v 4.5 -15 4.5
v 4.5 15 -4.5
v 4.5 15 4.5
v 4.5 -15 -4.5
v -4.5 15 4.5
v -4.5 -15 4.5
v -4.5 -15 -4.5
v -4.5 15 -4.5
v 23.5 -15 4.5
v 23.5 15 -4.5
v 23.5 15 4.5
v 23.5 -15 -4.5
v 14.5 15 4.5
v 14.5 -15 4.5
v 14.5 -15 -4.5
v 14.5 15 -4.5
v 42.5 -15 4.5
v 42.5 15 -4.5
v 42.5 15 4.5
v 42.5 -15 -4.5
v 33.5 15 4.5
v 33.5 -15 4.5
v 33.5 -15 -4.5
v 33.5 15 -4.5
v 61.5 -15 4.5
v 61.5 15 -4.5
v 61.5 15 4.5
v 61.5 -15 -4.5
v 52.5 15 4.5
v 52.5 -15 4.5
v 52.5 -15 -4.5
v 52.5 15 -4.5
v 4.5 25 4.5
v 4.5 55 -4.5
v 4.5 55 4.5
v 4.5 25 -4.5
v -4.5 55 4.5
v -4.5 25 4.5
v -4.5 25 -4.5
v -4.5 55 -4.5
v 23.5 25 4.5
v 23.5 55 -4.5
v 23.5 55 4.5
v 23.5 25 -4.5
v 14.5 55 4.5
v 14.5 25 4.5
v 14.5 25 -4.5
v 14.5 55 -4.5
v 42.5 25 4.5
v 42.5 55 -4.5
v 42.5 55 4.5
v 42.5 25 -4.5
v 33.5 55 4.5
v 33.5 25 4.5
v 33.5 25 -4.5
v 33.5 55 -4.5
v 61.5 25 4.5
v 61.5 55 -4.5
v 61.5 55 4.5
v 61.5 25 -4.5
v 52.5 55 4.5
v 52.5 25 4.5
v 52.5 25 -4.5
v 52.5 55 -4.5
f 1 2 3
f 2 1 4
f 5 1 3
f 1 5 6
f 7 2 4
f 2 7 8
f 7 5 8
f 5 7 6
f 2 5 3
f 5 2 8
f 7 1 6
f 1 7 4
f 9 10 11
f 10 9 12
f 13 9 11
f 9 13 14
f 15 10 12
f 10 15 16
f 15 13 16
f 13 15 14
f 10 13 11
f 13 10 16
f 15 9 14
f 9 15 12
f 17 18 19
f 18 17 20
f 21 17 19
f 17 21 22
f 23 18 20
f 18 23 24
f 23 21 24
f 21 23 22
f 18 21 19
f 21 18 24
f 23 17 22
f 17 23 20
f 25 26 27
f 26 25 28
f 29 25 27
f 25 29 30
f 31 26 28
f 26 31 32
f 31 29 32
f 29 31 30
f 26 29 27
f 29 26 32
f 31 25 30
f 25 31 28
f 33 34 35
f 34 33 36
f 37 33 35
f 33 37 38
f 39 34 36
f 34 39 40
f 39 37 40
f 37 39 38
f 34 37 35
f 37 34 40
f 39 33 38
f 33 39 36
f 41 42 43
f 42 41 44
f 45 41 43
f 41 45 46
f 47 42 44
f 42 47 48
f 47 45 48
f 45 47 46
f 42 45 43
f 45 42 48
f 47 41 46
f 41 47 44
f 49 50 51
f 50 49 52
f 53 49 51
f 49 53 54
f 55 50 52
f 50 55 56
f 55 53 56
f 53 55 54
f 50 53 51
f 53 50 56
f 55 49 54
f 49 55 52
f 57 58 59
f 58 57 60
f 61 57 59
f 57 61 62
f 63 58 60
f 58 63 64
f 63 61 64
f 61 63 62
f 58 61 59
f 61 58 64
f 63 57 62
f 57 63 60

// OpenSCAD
$fn=50; // Sets the number of fragments for rounded shapes. Increase for better resolution.
BOX_W = 9.0; // Box Width
BOX_L = 30;// Box Length
BOX_H = 9.0; // Box Height

module rectangle(width, height, length) {
    cube([width, length, height], center=true);
}

// Call the module to create four rectangular objects, each 10mm apart.
for (i=[0:3]) {
    translate([i*(BOX_W+10), 0, 0]) {
        rectangle(BOX_W, BOX_H, BOX_L);
    }
}

for (i=[0:3]) {
    translate([i*(BOX_W+10), BOX_L+10, 0]) {
        rectangle(BOX_W, BOX_H, BOX_L);
    }
}
